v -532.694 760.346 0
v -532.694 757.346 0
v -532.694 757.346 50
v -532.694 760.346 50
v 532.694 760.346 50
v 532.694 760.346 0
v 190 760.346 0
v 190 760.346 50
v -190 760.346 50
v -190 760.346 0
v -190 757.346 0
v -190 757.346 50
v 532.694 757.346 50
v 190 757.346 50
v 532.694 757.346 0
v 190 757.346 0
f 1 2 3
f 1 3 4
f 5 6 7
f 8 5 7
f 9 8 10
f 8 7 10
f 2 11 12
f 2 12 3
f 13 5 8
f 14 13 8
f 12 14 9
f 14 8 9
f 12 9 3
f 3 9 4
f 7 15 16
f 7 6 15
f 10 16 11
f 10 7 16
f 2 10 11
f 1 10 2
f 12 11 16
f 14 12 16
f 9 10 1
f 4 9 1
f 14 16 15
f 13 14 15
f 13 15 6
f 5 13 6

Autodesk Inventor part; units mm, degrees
ref_plane "YZ Plane" through (0, 0, 0) normal (1, 0, 0) x (0, 1, 0)
ref_plane "XZ Plane" through (0, 0, 0) normal (0, 1, 0) x (-1, 0, 0)
ref_plane "XY Plane" through (0, 0, 0) normal (0, 0, 1) x (1, 0, 0)
sketch "Sketch1" plane through (0, 0, 0) normal (0, 0, 1) x (1, 0, 0)
  line L0 (-749.422, 1137.6923) -> (749.422, 1137.6923) construction
  line L1 (-98.5795, 0) -> (98.5795, 0) construction
  line L2 (98.5795, 0) -> (749.422, 1137.6923) construction
  line L3 (-98.5795, 0) -> (-749.422, 1137.6923) construction
  line L4 (-190, 758.8462) -> (190, 758.8462)
  line L5 (190, 758.8462) -> (190, 378.8462) construction
  line L6 (190, 378.8462) -> (-190, 378.8462) construction
  line L7 (-190, 378.8462) -> (-190, 758.8462) construction
  line L8 (0, 1137.6923) -> (0, 0) construction
  line L9 (-190, 758.8462) -> (-190, 1137.6923) construction
  line L10 (190, 758.8462) -> (190, 1137.6923) construction
  line L11 (-190, 378.8462) -> (-190, 159.8058) construction
  line L12 (190, 378.8462) -> (190, 159.8058) construction
  line L13 (-570, 1137.6923) -> (-570, 824.0572) construction
  line L14 (-190, 758.8462) -> (-532.6945, 758.8462)
  line L15 (-190, 378.8462) -> (-315.307, 378.8462) construction
  line L16 (190, 378.8462) -> (315.307, 378.8462) construction
  line L17 (570, 1137.6923) -> (570, 824.0572) construction
  line L18 (190, 758.8462) -> (532.6945, 758.8462)
  line L19 (-571.5, 826.6793) -> (-568.5, 821.4352) construction
  point P0 (0, 758.8462)
  point P1 (-190, 568.8462)
  point P2 (0, 568.8462)
  dimension "d0" = 1498.844
  dimension "d1" = 197.159
  dimension "d2" = 1310.702
  dimension "d3" = 380
  dimension "d4" = 380
  dimension "d5" = 380
  dimension "d6" = 380
contour flange "Contour Flange1" sketch "Sketch1" thickness 3 bend radius 5 width 50 along (0, 0, 1) mid plane no both sides yes wall seen from (-361.3473, 758.8462, 0) lies toward (0, 1, 0) curves L14 L4 L18
bend "Bend1"
corner "Corner1"
equation "\"d5\" = d3"
equation "\"d6\" = d3"
equation "\"d7\" = Thickness"
equation "\"d8\" = BendReliefWidth"
equation "\"d9\" = BendReliefDepth"
equation "\"d10\" = MinimumRemnant"
equation "\"d11\" = TransitionRadius"
equation "\"d13\" = BendRadius"
equation "\"d15\" = CornerReliefSize"
equation "\"d16\" = GapSize"
equation "\"d17\" = JacobiRadiusSize"
equation "\"BendReliefWidth\" = Thickness"
equation "\"BendReliefDepth\" = 0.5 * Thickness"
equation "\"CornerReliefSize\" = 4 * Thickness"
equation "\"MinimumRemnant\" = 2 * Thickness"
equation "\"TransitionRadius\" = BendRadius"
equation "\"JacobiRadiusSize\" = BendRadius"
equation "\"GapSize\" = Thickness"
equation "\"Thickness\" = 3"
equation "\"BendRadius\" = 5"
properties part number "MSC 0561 rib cone" material "Stainless Steel"
